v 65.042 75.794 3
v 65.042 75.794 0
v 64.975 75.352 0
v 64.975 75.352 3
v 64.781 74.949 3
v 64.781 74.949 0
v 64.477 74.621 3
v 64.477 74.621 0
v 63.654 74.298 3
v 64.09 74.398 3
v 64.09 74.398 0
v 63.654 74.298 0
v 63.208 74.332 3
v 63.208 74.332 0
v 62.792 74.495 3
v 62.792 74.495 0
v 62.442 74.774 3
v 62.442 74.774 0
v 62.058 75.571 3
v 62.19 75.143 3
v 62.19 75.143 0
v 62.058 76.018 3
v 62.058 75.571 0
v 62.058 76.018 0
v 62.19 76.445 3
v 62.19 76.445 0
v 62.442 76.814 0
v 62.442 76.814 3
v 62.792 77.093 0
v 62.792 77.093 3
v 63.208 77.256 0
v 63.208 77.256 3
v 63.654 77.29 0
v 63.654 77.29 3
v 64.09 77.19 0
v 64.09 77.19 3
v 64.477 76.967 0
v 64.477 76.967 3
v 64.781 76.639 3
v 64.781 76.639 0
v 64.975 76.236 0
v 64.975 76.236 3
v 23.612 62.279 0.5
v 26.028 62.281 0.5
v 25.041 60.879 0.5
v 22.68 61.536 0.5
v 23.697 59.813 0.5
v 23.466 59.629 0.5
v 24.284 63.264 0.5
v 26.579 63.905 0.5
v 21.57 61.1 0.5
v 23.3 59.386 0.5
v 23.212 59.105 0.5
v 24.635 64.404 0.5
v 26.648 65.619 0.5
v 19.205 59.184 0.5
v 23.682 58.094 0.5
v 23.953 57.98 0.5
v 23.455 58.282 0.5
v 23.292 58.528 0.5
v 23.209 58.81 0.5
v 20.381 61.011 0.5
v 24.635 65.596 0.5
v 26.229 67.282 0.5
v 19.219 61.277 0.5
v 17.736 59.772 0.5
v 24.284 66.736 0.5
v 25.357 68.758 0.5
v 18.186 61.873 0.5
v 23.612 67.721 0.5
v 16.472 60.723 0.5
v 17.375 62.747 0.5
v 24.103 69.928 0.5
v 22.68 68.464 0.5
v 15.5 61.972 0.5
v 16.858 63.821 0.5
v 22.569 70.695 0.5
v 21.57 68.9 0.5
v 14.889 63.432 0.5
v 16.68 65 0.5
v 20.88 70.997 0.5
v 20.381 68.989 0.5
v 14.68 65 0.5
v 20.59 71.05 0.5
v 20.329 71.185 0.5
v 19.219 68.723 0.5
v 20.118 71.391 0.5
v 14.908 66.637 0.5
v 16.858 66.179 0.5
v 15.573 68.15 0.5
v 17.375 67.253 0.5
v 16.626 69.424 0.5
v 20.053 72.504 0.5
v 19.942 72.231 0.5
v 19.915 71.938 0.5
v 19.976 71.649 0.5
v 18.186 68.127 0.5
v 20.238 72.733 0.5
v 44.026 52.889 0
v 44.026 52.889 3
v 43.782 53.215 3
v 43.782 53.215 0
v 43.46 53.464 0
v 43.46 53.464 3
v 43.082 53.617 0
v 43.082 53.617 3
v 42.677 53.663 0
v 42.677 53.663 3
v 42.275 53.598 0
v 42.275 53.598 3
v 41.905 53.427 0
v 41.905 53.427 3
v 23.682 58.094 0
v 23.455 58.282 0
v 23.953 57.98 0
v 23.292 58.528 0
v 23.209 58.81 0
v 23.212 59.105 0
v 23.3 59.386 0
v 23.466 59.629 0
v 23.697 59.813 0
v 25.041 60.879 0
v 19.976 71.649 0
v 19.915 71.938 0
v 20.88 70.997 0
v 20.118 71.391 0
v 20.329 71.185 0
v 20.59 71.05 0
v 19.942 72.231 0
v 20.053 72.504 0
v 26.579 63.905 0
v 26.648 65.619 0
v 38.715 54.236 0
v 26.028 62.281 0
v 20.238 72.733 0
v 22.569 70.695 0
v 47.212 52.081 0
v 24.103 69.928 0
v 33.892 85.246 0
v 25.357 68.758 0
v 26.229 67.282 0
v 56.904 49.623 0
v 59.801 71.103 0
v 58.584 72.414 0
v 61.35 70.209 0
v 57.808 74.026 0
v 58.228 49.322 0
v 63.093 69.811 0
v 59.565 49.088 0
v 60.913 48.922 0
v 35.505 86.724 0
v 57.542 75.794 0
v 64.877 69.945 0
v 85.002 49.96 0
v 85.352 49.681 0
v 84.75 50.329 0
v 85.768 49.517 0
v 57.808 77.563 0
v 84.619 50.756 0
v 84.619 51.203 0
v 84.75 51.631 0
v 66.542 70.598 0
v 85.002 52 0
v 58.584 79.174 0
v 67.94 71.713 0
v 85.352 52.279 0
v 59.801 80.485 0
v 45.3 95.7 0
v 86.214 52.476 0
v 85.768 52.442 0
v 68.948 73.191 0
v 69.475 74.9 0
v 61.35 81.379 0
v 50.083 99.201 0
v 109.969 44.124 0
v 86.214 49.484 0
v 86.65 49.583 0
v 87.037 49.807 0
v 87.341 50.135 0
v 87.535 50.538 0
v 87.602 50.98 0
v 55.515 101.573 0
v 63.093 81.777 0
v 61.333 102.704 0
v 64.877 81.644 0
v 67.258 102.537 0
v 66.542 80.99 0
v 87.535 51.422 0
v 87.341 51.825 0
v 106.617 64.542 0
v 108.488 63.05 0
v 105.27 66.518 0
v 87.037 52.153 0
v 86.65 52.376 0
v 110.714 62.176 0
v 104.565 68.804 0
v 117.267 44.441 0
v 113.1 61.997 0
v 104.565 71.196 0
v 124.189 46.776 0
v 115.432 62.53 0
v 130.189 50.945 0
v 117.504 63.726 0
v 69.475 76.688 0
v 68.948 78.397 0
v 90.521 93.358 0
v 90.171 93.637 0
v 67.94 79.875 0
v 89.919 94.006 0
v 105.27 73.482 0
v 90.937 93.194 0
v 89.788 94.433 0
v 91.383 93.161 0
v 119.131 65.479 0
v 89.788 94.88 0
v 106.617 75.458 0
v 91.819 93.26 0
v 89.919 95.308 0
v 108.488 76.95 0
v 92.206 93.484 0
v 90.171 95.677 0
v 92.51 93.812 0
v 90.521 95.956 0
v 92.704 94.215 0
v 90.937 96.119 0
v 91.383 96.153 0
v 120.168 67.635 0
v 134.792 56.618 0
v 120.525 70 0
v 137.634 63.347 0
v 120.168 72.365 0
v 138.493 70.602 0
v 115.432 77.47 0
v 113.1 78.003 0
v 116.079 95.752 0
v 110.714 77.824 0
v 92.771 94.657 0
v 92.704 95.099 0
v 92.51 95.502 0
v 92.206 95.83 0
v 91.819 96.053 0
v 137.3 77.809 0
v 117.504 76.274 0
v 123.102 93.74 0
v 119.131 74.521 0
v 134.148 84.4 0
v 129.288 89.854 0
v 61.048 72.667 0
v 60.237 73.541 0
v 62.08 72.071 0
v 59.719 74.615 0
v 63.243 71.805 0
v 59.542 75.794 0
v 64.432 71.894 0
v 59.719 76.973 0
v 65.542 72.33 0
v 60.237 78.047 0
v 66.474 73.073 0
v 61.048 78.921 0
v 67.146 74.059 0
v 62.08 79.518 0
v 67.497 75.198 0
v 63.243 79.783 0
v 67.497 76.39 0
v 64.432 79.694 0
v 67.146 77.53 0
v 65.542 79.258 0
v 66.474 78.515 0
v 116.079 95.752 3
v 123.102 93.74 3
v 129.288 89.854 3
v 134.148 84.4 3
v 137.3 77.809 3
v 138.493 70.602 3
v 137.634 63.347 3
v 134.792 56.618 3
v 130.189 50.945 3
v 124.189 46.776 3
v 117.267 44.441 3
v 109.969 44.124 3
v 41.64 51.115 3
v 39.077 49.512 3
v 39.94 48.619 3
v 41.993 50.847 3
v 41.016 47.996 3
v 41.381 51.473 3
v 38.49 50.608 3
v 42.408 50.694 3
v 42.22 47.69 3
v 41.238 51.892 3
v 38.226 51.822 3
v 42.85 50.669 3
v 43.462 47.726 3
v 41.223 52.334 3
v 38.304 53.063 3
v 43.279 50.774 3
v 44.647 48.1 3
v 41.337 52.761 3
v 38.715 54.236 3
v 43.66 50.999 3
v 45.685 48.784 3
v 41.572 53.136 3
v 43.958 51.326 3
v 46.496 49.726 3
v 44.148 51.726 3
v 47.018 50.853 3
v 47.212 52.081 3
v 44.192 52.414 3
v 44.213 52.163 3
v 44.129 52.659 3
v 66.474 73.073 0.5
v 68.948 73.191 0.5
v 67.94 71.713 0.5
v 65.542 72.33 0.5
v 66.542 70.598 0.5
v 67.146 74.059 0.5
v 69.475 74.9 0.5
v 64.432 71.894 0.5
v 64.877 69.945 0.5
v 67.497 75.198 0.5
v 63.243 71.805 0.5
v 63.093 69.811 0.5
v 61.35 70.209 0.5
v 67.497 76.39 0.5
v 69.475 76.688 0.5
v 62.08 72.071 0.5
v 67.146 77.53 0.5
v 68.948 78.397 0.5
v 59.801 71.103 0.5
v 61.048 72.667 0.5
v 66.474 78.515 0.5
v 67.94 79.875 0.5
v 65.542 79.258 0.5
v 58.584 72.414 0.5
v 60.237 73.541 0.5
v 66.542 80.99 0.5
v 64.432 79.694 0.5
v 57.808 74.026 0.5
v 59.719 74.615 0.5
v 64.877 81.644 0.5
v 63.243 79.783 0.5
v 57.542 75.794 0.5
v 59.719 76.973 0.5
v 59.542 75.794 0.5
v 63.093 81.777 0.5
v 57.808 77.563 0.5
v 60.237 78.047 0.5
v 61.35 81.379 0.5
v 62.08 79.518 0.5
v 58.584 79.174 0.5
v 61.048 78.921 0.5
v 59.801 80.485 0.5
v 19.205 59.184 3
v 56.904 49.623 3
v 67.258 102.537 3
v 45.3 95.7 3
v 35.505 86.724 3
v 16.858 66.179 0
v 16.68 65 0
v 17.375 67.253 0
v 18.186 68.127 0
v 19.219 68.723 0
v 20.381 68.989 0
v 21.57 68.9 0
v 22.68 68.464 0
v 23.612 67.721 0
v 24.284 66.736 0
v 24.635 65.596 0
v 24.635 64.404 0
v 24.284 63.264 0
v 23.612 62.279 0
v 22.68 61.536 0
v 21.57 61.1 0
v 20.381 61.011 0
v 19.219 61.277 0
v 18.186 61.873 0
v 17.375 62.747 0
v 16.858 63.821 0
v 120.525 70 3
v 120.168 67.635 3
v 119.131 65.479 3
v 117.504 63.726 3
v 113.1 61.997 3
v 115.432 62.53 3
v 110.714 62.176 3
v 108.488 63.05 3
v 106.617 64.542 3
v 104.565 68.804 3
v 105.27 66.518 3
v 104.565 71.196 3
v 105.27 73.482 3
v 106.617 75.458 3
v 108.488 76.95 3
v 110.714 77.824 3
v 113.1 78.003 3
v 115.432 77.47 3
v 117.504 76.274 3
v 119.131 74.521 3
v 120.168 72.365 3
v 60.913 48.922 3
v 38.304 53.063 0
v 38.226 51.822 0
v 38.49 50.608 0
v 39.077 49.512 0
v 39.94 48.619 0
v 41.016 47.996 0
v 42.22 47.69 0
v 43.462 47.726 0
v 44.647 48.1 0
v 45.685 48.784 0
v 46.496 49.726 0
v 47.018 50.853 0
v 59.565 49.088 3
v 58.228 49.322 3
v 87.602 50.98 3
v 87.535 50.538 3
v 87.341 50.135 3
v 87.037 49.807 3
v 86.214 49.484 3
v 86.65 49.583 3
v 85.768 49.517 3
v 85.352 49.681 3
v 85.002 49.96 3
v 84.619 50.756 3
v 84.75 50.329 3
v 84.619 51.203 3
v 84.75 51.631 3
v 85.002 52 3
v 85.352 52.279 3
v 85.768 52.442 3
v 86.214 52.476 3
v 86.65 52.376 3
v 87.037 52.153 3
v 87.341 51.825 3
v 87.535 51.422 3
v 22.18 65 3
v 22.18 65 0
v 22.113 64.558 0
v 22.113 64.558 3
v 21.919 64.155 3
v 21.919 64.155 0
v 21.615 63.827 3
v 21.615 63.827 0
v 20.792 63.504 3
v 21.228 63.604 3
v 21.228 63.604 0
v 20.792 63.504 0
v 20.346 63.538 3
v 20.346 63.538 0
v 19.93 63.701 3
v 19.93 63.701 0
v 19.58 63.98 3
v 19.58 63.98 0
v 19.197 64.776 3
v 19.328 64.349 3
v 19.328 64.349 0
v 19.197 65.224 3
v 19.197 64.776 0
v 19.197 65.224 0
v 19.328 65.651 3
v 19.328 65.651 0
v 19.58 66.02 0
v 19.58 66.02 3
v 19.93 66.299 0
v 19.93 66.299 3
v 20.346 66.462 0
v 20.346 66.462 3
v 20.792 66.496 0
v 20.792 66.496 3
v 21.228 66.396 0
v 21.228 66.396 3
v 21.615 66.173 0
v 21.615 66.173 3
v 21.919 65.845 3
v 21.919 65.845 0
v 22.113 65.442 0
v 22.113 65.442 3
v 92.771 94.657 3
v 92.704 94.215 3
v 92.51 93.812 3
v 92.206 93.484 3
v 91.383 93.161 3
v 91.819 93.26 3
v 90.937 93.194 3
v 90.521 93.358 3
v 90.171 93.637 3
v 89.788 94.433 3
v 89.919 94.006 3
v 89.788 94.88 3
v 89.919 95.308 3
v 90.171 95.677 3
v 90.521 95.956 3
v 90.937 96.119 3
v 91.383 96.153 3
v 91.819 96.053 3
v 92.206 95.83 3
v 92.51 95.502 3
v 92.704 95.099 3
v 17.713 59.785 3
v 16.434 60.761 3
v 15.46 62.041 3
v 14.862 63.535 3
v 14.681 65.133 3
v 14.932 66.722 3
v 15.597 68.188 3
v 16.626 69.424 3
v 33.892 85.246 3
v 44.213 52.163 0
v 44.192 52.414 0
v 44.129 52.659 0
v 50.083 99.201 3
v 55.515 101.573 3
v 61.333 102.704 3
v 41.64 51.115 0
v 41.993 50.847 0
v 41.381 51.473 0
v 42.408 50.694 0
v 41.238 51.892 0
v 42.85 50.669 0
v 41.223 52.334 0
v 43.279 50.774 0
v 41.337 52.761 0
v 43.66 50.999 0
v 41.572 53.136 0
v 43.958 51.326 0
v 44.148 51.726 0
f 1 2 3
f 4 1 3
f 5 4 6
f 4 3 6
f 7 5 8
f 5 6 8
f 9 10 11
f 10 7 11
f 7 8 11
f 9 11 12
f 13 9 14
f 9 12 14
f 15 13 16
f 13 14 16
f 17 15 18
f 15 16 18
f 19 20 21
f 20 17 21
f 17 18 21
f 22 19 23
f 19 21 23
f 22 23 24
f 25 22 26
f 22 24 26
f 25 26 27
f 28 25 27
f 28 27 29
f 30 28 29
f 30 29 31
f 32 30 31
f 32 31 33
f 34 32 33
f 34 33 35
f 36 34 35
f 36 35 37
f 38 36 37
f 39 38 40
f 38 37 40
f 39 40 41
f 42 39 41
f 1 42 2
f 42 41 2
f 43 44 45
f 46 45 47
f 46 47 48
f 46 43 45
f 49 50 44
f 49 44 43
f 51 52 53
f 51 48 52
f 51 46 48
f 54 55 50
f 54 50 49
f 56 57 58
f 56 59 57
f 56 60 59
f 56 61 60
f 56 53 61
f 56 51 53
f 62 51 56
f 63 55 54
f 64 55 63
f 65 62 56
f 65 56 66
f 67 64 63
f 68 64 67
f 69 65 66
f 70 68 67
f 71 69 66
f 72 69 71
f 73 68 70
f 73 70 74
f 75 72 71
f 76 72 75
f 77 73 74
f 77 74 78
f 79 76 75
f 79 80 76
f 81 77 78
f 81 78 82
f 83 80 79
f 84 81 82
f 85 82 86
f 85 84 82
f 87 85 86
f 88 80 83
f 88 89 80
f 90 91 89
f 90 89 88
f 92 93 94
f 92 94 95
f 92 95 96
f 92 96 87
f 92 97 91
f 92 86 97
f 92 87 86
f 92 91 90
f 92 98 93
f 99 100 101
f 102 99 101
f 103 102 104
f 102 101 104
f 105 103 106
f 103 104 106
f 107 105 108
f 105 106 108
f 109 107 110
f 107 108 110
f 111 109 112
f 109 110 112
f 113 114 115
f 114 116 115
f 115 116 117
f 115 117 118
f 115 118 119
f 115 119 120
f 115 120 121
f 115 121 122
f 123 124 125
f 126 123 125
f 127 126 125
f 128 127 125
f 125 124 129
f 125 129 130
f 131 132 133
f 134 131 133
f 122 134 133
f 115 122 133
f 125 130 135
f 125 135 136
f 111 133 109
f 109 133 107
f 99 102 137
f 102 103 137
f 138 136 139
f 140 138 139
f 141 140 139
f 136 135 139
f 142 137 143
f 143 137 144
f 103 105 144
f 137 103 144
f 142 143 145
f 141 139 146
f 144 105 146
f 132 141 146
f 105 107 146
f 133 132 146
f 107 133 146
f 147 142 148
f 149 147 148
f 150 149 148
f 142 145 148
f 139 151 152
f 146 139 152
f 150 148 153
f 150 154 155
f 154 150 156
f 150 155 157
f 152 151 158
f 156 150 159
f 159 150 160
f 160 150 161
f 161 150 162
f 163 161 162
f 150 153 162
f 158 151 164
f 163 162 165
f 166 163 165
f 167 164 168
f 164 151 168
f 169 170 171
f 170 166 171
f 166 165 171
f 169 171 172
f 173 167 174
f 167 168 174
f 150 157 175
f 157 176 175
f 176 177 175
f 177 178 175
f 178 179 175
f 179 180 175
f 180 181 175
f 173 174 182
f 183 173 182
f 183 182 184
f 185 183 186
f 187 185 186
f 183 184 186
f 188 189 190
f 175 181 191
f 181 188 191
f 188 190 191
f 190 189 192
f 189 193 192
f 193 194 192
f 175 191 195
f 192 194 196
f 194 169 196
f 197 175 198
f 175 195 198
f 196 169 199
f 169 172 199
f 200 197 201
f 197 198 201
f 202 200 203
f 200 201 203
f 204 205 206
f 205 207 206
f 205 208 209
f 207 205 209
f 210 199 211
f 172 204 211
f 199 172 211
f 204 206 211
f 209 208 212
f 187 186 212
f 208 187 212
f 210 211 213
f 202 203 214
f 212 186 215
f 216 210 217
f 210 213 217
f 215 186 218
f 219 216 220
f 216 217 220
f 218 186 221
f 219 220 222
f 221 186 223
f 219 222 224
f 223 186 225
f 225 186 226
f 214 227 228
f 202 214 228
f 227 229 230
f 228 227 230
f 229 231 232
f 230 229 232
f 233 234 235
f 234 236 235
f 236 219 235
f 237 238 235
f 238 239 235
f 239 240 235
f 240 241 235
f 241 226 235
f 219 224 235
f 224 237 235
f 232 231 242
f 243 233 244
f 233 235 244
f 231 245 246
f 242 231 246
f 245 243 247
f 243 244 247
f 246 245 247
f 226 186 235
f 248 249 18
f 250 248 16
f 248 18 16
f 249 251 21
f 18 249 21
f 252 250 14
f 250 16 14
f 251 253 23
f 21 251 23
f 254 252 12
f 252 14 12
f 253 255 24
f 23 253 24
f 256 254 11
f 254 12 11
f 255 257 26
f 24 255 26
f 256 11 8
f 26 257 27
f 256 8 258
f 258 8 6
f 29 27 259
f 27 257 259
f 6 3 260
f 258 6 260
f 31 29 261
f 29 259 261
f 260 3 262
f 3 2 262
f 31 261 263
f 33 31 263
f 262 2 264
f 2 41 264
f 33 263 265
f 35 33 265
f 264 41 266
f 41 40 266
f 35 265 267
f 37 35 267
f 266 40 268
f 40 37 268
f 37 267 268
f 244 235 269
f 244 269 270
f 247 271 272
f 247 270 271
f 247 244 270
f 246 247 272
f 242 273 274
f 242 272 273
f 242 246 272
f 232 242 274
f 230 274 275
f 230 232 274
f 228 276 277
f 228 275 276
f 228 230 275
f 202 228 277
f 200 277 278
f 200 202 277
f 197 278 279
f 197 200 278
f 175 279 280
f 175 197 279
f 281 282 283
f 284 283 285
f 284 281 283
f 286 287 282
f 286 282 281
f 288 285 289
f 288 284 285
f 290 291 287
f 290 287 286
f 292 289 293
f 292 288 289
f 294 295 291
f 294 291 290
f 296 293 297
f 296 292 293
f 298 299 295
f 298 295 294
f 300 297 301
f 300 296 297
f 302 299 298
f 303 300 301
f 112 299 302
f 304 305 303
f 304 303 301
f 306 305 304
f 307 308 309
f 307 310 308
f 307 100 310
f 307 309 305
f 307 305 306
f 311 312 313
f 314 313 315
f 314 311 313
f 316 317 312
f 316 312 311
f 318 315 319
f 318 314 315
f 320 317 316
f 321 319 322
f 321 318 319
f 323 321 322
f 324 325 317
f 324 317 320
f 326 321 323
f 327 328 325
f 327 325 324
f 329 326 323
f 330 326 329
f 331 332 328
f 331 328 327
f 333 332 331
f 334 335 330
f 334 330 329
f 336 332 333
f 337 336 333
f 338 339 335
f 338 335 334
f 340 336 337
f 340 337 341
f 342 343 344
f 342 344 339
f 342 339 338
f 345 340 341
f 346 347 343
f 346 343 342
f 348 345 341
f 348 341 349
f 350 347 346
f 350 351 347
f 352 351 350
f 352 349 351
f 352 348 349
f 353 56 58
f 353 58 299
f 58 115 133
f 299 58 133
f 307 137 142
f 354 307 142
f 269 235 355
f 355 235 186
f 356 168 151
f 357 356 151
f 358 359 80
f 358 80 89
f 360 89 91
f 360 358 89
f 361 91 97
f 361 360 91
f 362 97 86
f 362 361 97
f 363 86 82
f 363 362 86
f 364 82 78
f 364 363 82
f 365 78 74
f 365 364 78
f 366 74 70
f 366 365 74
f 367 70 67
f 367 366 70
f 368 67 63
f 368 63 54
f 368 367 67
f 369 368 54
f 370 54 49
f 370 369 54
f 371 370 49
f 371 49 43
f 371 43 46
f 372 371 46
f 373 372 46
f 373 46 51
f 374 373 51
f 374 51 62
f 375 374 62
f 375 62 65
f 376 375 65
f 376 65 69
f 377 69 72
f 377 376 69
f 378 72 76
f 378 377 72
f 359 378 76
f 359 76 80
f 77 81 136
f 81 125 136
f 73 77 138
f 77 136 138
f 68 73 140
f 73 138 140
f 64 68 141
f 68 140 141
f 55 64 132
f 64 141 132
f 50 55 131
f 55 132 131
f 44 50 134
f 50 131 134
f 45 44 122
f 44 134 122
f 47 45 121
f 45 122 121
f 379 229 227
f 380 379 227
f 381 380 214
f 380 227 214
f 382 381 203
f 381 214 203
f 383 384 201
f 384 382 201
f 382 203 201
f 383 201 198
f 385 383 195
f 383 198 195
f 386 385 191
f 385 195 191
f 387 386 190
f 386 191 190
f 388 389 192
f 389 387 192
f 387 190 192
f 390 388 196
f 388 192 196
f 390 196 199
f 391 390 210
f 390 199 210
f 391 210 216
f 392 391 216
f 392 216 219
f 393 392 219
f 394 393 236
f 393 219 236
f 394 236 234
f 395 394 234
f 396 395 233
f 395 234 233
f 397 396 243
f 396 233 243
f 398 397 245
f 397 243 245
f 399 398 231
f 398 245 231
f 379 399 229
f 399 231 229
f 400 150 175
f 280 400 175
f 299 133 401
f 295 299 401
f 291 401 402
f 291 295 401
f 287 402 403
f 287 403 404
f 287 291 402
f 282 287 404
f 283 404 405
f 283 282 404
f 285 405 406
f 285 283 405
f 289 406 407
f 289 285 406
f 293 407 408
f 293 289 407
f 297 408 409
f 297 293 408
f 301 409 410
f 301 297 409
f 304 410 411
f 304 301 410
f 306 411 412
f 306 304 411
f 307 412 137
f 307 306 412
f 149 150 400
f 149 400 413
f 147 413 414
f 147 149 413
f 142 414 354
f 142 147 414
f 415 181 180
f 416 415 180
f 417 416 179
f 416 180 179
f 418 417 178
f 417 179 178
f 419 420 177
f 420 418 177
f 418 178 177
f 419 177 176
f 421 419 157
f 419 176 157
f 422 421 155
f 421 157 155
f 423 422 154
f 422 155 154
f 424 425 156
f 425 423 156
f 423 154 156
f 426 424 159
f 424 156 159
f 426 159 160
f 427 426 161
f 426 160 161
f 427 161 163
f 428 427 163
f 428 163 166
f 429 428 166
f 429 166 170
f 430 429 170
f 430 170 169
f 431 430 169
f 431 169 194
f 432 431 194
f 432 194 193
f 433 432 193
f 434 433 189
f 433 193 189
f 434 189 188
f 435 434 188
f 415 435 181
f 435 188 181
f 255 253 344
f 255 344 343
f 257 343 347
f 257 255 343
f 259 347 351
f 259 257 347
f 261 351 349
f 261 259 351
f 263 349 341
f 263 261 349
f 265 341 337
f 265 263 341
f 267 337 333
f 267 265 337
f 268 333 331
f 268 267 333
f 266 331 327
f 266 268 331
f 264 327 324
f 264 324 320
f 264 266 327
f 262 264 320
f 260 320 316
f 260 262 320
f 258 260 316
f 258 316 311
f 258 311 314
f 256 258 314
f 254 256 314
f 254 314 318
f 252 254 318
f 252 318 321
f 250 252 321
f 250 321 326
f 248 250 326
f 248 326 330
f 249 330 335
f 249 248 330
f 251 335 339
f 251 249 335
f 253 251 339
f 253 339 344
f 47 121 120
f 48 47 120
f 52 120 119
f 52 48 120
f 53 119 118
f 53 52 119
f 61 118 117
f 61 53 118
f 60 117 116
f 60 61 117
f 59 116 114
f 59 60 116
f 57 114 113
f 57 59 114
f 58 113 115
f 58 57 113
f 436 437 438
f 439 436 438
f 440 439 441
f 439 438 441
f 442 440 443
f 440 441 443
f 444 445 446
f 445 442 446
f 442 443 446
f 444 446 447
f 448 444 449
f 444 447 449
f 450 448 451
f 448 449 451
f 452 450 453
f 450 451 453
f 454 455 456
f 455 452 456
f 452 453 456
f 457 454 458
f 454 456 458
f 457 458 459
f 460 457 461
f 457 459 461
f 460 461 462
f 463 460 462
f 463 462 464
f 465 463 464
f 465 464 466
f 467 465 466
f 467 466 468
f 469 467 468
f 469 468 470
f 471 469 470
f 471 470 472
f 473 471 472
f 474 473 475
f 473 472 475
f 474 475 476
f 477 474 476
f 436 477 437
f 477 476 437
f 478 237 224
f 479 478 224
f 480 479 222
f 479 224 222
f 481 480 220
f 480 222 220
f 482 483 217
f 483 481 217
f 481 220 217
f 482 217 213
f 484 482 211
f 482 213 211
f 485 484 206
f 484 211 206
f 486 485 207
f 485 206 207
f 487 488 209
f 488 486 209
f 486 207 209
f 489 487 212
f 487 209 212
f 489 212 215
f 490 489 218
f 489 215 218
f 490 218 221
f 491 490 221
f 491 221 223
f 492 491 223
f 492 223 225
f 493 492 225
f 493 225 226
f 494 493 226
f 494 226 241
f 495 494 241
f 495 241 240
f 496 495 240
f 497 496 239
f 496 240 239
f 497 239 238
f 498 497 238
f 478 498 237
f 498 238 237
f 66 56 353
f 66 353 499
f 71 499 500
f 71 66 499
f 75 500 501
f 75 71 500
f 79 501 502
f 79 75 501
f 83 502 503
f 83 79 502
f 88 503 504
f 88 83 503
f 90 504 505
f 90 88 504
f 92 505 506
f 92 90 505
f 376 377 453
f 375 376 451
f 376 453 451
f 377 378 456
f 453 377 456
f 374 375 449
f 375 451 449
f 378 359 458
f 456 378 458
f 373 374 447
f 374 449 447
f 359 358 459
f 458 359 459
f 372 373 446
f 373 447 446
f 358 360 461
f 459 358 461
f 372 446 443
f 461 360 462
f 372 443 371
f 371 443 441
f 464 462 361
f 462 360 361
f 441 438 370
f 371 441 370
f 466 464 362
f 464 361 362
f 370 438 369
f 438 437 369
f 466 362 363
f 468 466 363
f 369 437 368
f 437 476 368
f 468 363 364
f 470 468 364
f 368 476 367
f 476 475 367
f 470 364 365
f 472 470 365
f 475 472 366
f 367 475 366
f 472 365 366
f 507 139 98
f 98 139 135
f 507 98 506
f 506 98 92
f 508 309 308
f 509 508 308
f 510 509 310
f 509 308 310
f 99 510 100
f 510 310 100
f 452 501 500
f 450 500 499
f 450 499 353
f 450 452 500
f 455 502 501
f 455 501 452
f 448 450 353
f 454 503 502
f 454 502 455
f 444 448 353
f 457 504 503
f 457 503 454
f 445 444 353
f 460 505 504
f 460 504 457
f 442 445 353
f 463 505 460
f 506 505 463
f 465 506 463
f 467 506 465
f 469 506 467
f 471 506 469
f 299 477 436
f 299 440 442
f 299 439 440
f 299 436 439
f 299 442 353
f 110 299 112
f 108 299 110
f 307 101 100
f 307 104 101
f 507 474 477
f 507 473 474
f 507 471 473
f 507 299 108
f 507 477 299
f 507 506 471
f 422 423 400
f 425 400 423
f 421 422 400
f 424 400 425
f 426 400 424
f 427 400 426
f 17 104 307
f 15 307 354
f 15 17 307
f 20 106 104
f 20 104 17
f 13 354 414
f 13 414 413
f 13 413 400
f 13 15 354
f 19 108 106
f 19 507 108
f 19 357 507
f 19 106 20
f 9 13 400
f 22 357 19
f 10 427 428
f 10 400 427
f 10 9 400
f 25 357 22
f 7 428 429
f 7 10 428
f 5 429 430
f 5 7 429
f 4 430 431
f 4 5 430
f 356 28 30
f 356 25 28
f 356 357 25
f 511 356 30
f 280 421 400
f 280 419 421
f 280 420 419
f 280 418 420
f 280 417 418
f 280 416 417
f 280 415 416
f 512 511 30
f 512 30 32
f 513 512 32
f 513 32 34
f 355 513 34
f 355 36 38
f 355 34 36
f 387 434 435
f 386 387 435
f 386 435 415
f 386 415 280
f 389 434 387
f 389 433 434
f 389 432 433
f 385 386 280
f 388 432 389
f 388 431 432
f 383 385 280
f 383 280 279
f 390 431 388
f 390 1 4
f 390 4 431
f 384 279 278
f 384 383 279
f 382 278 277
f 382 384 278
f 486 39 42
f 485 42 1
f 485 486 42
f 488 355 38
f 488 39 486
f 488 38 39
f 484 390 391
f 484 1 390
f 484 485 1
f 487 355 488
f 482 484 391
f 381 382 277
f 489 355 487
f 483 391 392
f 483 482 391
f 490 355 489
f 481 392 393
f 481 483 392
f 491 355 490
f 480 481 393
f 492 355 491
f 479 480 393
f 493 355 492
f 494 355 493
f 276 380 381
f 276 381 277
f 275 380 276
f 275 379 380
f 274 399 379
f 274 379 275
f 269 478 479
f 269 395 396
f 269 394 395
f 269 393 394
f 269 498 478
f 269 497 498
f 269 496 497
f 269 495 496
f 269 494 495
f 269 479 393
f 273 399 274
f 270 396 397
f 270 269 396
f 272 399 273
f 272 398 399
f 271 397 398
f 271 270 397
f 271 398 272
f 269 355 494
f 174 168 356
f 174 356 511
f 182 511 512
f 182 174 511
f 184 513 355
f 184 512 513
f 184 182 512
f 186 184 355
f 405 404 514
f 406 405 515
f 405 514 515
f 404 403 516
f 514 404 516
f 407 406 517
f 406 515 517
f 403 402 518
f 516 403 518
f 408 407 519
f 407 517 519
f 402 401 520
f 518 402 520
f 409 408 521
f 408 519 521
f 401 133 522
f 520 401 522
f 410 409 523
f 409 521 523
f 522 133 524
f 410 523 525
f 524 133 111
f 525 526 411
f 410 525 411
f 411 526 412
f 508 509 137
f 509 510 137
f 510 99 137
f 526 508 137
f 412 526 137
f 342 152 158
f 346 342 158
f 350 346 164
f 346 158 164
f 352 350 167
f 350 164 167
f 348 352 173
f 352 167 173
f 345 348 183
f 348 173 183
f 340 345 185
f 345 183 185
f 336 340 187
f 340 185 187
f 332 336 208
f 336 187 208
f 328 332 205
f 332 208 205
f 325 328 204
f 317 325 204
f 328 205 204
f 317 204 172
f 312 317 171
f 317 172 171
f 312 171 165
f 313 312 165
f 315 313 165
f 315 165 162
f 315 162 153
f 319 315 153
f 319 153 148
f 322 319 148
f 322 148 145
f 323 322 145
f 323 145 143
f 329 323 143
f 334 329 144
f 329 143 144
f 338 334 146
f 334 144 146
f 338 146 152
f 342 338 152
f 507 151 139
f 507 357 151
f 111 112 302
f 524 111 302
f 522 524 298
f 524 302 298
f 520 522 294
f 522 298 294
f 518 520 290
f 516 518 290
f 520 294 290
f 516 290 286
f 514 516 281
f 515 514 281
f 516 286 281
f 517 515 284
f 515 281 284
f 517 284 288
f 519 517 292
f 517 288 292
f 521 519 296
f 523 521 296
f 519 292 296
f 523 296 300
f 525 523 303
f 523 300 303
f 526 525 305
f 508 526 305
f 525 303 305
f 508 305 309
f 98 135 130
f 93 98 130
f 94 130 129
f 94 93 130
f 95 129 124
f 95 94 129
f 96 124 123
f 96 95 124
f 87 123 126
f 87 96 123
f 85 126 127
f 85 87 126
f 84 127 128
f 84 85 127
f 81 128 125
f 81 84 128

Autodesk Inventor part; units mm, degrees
ref_plane "YZ Plane" through (0, 0, 0) normal (1, 0, 0) x (0, 1, 0)
ref_plane "XZ Plane" through (0, 0, 0) normal (0, 1, 0) x (-1, 0, 0)
ref_plane "XY Plane" through (0, 0, 0) normal (0, 0, 1) x (1, 0, 0)
sketch "スケッチ1" plane through (0, 0, 0) normal (0, 0, 1) x (1, 0, 0)
  circle A0 centre (-27.1196, 80) radius 1.5
  circle A1 centre (-27.1196, 80) radius 6
  circle A2 centre (20.6799, 65) radius 1.5
  circle A3 centre (20.6799, 65) radius 6
  circle A4 centre (63.5417, 75.7941) radius 1.5
  circle A5 centre (-68.1796, 83.3936) radius 1.5
  circle A6 centre (-112.5, 70) radius 8.025
  circle A7 centre (112.5, 70) radius 8.025
  arc A8 (109.9686, 44.1235) -> (116.0788, 95.7525) centre (112.5, 70) ccw
  circle A9 centre (-94.9808, 96.6696) radius 4.5
  circle A10 centre (-94.9808, 96.6696) radius 1.5
  circle A11 centre (-83.1426, 57.4965) radius 1.5
  circle A12 centre (-83.1426, 57.4965) radius 4.5
  circle A13 centre (86.1018, 50.9798) radius 4.5
  circle A14 centre (86.1018, 50.9798) radius 1.5
  circle A15 centre (91.2708, 94.6568) radius 1.5
  circle A16 centre (91.2708, 94.6568) radius 4.5
  line L0 (-103.9107, 45.4598) -> (-60.251, 60.7411)
  line L1 (-118.9391, 95.19) -> (-74.1234, 106.646)
  line L2 (-55.9515, 104.0449) -> (-24.0626, 85.1628)
  line L3 (-24.9517, 74.4053) -> (-59.508, 61.015)
  line L4 (116.0788, 95.7525) -> (67.2581, 102.5371)
  line L5 (45.3001, 95.7) -> (16.6263, 69.4235)
  line L6 (19.2049, 59.1841) -> (56.904, 49.6227)
  line L7 (60.9129, 48.9224) -> (109.9686, 44.1235)
  arc A17 (-118.9391, 95.19) -> (-103.9107, 45.4598) centre (-112.5, 70) ccw
  arc A18 (-60.251, 60.7411) -> (-59.508, 61.015) centre (-68.1796, 83.3936) ccw
  arc A19 (-55.9515, 104.0449) -> (-74.1234, 106.646) centre (-68.1796, 83.3936) ccw
  arc A20 (56.904, 49.6227) -> (60.9129, 48.9224) centre (63.5417, 75.7941) ccw
  arc A21 (67.2581, 102.5371) -> (45.3001, 95.7) centre (63.5417, 75.7941) ccw
  point P0 (0, 0)
  point P1 (0, 0)
  point P2 (0, 0)
  dimension "d0" = 3
  dimension "d1" = 12
  dimension "d2" = 3
  dimension "d3" = 12
  dimension "d4" = 3
  dimension "d5" = 3
  dimension "d6" = 16.05
  dimension "d7" = 16.05
  dimension "d8" = 52
  dimension "d9" = 9
  dimension "d10" = 3
  dimension "d11" = 3
  dimension "d12" = 9
  dimension "d13" = 9
  dimension "d14" = 3
  dimension "d15" = 3
  dimension "d16" = 9
  dimension "d17" = 2.0367
  dimension "d18" = 2.0367
  dimension "d19" = 24
  dimension "d20" = 24
  dimension "d21" = 26
  dimension "d22" = 27
  dimension "d23" = 27
  dimension "d24" = 31.9091
  dimension "d25" = 31.9091
  dimension "d26" = 32.5367
  dimension "d27" = 32.5367
extrude "押し出し1" add sketch "スケッチ1" along normal blind 3 contours A3 | A13 | A16 | A3 L5 A21 L4 A8 L7 A20 L6
sketch "スケッチ2" plane through (0, 0, 3) normal (0, 0, 1) x (1, 0, 0)
  arc A0 (56.904, 49.6227) -> (60.9129, 48.9224) centre (63.5417, 75.7941) ccw projected
  line L0 (60.9129, 48.9224) -> (109.9686, 44.1235) projected
  arc A1 (109.9686, 44.1235) -> (116.0788, 95.7525) centre (112.5, 70) ccw projected
  line L1 (116.0788, 95.7525) -> (67.2581, 102.5371) projected
  arc A2 (67.2581, 102.5371) -> (45.3001, 95.7) centre (63.5417, 75.7941) ccw projected
  line L2 (45.3001, 95.7) -> (16.6263, 69.4235) projected
  arc A3 (16.6263, 69.4235) -> (19.2049, 59.1841) centre (20.6799, 65) ccw projected
  line L3 (19.2049, 59.1841) -> (56.904, 49.6227) projected
  circle A4 centre (91.2708, 94.6568) radius 1.5 projected
  circle A5 centre (86.1018, 50.9798) radius 1.5 projected
  circle A6 centre (112.5, 70) radius 8.025 projected
  circle A7 centre (63.5417, 75.7941) radius 1.5 projected
  circle A8 centre (20.6799, 65) radius 1.5 projected
  circle A9 centre (63.5417, 75.7941) radius 27
  circle A10 centre (20.6799, 65) radius 21
  circle A11 centre (34.0051, 86.7414) radius 4.5
  circle A12 centre (34.0051, 86.7414) radius 1.5
  circle A13 centre (42.7132, 52.1631) radius 1.5
  circle A14 centre (42.7132, 52.1631) radius 4.5
  point P0 (0, 0)
  point P1 (38.7185, 54.235)
  point P2 (47.2124, 52.0807)
  point P3 (44.0259, 52.8889)
  point P4 (41.9051, 53.4268)
  point P5 (35.505, 86.7239)
  point P6 (37.9287, 88.9449)
  point P7 (31.4683, 83.0247)
  point P8 (33.892, 85.2457)
  dimension "d30" = 54
  dimension "d31" = 42
  dimension "d32" = 9
  dimension "d33" = 3
  dimension "d34" = 3
  dimension "d35" = 9
extrude "押し出し2" add sketch "スケッチ2" against normal blind 3 contours A14 L3 A13
sketch "スケッチ3" plane through (0, 0, 3) normal (0, 0, 1) x (1, 0, 0)
  line L0 (47.2124, 52.0807) -> (56.904, 49.6227) projected
  arc A0 (56.904, 49.6227) -> (60.9129, 48.9224) centre (63.5417, 75.7941) ccw projected
  line L1 (60.9129, 48.9224) -> (109.9686, 44.1235) projected
  arc A1 (109.9686, 44.1235) -> (116.0788, 95.7525) centre (112.5, 70) ccw projected
  line L2 (116.0788, 95.7525) -> (67.2581, 102.5371) projected
  arc A2 (67.2581, 102.5371) -> (45.3001, 95.7) centre (63.5417, 75.7941) ccw projected
  line L3 (45.3001, 95.7) -> (16.6263, 69.4235) projected
  arc A3 (16.6263, 69.4235) -> (19.2049, 59.1841) centre (20.6799, 65) ccw projected
  circle A4 centre (91.2708, 94.6568) radius 1.5 projected
  circle A5 centre (86.1018, 50.9798) radius 1.5 projected
  circle A6 centre (112.5, 70) radius 8.025 projected
  circle A7 centre (63.5417, 75.7941) radius 1.5 projected
  circle A8 centre (20.6799, 65) radius 1.5 projected
  circle A9 centre (34.0051, 86.7414) radius 1.5
  circle A10 centre (42.7132, 52.1631) radius 1.5
  arc A11 (38.7185, 54.235) -> (47.2124, 52.0807) centre (42.7132, 52.1631) ccw projected
  line L4 (19.2049, 59.1841) -> (38.7185, 54.235) projected
  point P0 (0, 0)
  point P1 (41.9051, 53.4268)
  point P2 (44.0259, 52.8889)
  point P3 (35.505, 86.7239)
  point P4 (33.892, 85.2457)
  dimension "d38" = 3
  dimension "d39" = 3
extrude "押し出し3" cut sketch "スケッチ3" against normal blind 3 contours A9 L3 | A10 picked at (33.6626, 86.26)
sketch "スケッチ4" plane through (0, 0, 0) normal (0, 0, -1) x (-1, 0, 0)
  circle A0 centre (-63.5417, 75.7941) radius 1.5 projected
  circle A1 centre (-20.6799, 65) radius 1.5 projected
  circle A2 centre (-20.6799, 65) radius 6
  circle A3 centre (-20.6799, 65) radius 4
  circle A4 centre (-63.5417, 75.7941) radius 4
  circle A5 centre (-63.5417, 75.7941) radius 6
  point P0 (0, 0)
  dimension "d42" = 12
  dimension "d43" = 8
  dimension "d44" = 8
  dimension "d45" = 12
extrude "押し出し4" cut sketch "スケッチ4" against normal blind 0.5 contours A2 | A5
fillet "フィレット1" radius 1 2 edges at (19.2049, 59.1841, 0.25) (16.6263, 69.4235, 0.25)
properties part number "後脚ギアトレイン5.1" material "アルミニウム 7075"
